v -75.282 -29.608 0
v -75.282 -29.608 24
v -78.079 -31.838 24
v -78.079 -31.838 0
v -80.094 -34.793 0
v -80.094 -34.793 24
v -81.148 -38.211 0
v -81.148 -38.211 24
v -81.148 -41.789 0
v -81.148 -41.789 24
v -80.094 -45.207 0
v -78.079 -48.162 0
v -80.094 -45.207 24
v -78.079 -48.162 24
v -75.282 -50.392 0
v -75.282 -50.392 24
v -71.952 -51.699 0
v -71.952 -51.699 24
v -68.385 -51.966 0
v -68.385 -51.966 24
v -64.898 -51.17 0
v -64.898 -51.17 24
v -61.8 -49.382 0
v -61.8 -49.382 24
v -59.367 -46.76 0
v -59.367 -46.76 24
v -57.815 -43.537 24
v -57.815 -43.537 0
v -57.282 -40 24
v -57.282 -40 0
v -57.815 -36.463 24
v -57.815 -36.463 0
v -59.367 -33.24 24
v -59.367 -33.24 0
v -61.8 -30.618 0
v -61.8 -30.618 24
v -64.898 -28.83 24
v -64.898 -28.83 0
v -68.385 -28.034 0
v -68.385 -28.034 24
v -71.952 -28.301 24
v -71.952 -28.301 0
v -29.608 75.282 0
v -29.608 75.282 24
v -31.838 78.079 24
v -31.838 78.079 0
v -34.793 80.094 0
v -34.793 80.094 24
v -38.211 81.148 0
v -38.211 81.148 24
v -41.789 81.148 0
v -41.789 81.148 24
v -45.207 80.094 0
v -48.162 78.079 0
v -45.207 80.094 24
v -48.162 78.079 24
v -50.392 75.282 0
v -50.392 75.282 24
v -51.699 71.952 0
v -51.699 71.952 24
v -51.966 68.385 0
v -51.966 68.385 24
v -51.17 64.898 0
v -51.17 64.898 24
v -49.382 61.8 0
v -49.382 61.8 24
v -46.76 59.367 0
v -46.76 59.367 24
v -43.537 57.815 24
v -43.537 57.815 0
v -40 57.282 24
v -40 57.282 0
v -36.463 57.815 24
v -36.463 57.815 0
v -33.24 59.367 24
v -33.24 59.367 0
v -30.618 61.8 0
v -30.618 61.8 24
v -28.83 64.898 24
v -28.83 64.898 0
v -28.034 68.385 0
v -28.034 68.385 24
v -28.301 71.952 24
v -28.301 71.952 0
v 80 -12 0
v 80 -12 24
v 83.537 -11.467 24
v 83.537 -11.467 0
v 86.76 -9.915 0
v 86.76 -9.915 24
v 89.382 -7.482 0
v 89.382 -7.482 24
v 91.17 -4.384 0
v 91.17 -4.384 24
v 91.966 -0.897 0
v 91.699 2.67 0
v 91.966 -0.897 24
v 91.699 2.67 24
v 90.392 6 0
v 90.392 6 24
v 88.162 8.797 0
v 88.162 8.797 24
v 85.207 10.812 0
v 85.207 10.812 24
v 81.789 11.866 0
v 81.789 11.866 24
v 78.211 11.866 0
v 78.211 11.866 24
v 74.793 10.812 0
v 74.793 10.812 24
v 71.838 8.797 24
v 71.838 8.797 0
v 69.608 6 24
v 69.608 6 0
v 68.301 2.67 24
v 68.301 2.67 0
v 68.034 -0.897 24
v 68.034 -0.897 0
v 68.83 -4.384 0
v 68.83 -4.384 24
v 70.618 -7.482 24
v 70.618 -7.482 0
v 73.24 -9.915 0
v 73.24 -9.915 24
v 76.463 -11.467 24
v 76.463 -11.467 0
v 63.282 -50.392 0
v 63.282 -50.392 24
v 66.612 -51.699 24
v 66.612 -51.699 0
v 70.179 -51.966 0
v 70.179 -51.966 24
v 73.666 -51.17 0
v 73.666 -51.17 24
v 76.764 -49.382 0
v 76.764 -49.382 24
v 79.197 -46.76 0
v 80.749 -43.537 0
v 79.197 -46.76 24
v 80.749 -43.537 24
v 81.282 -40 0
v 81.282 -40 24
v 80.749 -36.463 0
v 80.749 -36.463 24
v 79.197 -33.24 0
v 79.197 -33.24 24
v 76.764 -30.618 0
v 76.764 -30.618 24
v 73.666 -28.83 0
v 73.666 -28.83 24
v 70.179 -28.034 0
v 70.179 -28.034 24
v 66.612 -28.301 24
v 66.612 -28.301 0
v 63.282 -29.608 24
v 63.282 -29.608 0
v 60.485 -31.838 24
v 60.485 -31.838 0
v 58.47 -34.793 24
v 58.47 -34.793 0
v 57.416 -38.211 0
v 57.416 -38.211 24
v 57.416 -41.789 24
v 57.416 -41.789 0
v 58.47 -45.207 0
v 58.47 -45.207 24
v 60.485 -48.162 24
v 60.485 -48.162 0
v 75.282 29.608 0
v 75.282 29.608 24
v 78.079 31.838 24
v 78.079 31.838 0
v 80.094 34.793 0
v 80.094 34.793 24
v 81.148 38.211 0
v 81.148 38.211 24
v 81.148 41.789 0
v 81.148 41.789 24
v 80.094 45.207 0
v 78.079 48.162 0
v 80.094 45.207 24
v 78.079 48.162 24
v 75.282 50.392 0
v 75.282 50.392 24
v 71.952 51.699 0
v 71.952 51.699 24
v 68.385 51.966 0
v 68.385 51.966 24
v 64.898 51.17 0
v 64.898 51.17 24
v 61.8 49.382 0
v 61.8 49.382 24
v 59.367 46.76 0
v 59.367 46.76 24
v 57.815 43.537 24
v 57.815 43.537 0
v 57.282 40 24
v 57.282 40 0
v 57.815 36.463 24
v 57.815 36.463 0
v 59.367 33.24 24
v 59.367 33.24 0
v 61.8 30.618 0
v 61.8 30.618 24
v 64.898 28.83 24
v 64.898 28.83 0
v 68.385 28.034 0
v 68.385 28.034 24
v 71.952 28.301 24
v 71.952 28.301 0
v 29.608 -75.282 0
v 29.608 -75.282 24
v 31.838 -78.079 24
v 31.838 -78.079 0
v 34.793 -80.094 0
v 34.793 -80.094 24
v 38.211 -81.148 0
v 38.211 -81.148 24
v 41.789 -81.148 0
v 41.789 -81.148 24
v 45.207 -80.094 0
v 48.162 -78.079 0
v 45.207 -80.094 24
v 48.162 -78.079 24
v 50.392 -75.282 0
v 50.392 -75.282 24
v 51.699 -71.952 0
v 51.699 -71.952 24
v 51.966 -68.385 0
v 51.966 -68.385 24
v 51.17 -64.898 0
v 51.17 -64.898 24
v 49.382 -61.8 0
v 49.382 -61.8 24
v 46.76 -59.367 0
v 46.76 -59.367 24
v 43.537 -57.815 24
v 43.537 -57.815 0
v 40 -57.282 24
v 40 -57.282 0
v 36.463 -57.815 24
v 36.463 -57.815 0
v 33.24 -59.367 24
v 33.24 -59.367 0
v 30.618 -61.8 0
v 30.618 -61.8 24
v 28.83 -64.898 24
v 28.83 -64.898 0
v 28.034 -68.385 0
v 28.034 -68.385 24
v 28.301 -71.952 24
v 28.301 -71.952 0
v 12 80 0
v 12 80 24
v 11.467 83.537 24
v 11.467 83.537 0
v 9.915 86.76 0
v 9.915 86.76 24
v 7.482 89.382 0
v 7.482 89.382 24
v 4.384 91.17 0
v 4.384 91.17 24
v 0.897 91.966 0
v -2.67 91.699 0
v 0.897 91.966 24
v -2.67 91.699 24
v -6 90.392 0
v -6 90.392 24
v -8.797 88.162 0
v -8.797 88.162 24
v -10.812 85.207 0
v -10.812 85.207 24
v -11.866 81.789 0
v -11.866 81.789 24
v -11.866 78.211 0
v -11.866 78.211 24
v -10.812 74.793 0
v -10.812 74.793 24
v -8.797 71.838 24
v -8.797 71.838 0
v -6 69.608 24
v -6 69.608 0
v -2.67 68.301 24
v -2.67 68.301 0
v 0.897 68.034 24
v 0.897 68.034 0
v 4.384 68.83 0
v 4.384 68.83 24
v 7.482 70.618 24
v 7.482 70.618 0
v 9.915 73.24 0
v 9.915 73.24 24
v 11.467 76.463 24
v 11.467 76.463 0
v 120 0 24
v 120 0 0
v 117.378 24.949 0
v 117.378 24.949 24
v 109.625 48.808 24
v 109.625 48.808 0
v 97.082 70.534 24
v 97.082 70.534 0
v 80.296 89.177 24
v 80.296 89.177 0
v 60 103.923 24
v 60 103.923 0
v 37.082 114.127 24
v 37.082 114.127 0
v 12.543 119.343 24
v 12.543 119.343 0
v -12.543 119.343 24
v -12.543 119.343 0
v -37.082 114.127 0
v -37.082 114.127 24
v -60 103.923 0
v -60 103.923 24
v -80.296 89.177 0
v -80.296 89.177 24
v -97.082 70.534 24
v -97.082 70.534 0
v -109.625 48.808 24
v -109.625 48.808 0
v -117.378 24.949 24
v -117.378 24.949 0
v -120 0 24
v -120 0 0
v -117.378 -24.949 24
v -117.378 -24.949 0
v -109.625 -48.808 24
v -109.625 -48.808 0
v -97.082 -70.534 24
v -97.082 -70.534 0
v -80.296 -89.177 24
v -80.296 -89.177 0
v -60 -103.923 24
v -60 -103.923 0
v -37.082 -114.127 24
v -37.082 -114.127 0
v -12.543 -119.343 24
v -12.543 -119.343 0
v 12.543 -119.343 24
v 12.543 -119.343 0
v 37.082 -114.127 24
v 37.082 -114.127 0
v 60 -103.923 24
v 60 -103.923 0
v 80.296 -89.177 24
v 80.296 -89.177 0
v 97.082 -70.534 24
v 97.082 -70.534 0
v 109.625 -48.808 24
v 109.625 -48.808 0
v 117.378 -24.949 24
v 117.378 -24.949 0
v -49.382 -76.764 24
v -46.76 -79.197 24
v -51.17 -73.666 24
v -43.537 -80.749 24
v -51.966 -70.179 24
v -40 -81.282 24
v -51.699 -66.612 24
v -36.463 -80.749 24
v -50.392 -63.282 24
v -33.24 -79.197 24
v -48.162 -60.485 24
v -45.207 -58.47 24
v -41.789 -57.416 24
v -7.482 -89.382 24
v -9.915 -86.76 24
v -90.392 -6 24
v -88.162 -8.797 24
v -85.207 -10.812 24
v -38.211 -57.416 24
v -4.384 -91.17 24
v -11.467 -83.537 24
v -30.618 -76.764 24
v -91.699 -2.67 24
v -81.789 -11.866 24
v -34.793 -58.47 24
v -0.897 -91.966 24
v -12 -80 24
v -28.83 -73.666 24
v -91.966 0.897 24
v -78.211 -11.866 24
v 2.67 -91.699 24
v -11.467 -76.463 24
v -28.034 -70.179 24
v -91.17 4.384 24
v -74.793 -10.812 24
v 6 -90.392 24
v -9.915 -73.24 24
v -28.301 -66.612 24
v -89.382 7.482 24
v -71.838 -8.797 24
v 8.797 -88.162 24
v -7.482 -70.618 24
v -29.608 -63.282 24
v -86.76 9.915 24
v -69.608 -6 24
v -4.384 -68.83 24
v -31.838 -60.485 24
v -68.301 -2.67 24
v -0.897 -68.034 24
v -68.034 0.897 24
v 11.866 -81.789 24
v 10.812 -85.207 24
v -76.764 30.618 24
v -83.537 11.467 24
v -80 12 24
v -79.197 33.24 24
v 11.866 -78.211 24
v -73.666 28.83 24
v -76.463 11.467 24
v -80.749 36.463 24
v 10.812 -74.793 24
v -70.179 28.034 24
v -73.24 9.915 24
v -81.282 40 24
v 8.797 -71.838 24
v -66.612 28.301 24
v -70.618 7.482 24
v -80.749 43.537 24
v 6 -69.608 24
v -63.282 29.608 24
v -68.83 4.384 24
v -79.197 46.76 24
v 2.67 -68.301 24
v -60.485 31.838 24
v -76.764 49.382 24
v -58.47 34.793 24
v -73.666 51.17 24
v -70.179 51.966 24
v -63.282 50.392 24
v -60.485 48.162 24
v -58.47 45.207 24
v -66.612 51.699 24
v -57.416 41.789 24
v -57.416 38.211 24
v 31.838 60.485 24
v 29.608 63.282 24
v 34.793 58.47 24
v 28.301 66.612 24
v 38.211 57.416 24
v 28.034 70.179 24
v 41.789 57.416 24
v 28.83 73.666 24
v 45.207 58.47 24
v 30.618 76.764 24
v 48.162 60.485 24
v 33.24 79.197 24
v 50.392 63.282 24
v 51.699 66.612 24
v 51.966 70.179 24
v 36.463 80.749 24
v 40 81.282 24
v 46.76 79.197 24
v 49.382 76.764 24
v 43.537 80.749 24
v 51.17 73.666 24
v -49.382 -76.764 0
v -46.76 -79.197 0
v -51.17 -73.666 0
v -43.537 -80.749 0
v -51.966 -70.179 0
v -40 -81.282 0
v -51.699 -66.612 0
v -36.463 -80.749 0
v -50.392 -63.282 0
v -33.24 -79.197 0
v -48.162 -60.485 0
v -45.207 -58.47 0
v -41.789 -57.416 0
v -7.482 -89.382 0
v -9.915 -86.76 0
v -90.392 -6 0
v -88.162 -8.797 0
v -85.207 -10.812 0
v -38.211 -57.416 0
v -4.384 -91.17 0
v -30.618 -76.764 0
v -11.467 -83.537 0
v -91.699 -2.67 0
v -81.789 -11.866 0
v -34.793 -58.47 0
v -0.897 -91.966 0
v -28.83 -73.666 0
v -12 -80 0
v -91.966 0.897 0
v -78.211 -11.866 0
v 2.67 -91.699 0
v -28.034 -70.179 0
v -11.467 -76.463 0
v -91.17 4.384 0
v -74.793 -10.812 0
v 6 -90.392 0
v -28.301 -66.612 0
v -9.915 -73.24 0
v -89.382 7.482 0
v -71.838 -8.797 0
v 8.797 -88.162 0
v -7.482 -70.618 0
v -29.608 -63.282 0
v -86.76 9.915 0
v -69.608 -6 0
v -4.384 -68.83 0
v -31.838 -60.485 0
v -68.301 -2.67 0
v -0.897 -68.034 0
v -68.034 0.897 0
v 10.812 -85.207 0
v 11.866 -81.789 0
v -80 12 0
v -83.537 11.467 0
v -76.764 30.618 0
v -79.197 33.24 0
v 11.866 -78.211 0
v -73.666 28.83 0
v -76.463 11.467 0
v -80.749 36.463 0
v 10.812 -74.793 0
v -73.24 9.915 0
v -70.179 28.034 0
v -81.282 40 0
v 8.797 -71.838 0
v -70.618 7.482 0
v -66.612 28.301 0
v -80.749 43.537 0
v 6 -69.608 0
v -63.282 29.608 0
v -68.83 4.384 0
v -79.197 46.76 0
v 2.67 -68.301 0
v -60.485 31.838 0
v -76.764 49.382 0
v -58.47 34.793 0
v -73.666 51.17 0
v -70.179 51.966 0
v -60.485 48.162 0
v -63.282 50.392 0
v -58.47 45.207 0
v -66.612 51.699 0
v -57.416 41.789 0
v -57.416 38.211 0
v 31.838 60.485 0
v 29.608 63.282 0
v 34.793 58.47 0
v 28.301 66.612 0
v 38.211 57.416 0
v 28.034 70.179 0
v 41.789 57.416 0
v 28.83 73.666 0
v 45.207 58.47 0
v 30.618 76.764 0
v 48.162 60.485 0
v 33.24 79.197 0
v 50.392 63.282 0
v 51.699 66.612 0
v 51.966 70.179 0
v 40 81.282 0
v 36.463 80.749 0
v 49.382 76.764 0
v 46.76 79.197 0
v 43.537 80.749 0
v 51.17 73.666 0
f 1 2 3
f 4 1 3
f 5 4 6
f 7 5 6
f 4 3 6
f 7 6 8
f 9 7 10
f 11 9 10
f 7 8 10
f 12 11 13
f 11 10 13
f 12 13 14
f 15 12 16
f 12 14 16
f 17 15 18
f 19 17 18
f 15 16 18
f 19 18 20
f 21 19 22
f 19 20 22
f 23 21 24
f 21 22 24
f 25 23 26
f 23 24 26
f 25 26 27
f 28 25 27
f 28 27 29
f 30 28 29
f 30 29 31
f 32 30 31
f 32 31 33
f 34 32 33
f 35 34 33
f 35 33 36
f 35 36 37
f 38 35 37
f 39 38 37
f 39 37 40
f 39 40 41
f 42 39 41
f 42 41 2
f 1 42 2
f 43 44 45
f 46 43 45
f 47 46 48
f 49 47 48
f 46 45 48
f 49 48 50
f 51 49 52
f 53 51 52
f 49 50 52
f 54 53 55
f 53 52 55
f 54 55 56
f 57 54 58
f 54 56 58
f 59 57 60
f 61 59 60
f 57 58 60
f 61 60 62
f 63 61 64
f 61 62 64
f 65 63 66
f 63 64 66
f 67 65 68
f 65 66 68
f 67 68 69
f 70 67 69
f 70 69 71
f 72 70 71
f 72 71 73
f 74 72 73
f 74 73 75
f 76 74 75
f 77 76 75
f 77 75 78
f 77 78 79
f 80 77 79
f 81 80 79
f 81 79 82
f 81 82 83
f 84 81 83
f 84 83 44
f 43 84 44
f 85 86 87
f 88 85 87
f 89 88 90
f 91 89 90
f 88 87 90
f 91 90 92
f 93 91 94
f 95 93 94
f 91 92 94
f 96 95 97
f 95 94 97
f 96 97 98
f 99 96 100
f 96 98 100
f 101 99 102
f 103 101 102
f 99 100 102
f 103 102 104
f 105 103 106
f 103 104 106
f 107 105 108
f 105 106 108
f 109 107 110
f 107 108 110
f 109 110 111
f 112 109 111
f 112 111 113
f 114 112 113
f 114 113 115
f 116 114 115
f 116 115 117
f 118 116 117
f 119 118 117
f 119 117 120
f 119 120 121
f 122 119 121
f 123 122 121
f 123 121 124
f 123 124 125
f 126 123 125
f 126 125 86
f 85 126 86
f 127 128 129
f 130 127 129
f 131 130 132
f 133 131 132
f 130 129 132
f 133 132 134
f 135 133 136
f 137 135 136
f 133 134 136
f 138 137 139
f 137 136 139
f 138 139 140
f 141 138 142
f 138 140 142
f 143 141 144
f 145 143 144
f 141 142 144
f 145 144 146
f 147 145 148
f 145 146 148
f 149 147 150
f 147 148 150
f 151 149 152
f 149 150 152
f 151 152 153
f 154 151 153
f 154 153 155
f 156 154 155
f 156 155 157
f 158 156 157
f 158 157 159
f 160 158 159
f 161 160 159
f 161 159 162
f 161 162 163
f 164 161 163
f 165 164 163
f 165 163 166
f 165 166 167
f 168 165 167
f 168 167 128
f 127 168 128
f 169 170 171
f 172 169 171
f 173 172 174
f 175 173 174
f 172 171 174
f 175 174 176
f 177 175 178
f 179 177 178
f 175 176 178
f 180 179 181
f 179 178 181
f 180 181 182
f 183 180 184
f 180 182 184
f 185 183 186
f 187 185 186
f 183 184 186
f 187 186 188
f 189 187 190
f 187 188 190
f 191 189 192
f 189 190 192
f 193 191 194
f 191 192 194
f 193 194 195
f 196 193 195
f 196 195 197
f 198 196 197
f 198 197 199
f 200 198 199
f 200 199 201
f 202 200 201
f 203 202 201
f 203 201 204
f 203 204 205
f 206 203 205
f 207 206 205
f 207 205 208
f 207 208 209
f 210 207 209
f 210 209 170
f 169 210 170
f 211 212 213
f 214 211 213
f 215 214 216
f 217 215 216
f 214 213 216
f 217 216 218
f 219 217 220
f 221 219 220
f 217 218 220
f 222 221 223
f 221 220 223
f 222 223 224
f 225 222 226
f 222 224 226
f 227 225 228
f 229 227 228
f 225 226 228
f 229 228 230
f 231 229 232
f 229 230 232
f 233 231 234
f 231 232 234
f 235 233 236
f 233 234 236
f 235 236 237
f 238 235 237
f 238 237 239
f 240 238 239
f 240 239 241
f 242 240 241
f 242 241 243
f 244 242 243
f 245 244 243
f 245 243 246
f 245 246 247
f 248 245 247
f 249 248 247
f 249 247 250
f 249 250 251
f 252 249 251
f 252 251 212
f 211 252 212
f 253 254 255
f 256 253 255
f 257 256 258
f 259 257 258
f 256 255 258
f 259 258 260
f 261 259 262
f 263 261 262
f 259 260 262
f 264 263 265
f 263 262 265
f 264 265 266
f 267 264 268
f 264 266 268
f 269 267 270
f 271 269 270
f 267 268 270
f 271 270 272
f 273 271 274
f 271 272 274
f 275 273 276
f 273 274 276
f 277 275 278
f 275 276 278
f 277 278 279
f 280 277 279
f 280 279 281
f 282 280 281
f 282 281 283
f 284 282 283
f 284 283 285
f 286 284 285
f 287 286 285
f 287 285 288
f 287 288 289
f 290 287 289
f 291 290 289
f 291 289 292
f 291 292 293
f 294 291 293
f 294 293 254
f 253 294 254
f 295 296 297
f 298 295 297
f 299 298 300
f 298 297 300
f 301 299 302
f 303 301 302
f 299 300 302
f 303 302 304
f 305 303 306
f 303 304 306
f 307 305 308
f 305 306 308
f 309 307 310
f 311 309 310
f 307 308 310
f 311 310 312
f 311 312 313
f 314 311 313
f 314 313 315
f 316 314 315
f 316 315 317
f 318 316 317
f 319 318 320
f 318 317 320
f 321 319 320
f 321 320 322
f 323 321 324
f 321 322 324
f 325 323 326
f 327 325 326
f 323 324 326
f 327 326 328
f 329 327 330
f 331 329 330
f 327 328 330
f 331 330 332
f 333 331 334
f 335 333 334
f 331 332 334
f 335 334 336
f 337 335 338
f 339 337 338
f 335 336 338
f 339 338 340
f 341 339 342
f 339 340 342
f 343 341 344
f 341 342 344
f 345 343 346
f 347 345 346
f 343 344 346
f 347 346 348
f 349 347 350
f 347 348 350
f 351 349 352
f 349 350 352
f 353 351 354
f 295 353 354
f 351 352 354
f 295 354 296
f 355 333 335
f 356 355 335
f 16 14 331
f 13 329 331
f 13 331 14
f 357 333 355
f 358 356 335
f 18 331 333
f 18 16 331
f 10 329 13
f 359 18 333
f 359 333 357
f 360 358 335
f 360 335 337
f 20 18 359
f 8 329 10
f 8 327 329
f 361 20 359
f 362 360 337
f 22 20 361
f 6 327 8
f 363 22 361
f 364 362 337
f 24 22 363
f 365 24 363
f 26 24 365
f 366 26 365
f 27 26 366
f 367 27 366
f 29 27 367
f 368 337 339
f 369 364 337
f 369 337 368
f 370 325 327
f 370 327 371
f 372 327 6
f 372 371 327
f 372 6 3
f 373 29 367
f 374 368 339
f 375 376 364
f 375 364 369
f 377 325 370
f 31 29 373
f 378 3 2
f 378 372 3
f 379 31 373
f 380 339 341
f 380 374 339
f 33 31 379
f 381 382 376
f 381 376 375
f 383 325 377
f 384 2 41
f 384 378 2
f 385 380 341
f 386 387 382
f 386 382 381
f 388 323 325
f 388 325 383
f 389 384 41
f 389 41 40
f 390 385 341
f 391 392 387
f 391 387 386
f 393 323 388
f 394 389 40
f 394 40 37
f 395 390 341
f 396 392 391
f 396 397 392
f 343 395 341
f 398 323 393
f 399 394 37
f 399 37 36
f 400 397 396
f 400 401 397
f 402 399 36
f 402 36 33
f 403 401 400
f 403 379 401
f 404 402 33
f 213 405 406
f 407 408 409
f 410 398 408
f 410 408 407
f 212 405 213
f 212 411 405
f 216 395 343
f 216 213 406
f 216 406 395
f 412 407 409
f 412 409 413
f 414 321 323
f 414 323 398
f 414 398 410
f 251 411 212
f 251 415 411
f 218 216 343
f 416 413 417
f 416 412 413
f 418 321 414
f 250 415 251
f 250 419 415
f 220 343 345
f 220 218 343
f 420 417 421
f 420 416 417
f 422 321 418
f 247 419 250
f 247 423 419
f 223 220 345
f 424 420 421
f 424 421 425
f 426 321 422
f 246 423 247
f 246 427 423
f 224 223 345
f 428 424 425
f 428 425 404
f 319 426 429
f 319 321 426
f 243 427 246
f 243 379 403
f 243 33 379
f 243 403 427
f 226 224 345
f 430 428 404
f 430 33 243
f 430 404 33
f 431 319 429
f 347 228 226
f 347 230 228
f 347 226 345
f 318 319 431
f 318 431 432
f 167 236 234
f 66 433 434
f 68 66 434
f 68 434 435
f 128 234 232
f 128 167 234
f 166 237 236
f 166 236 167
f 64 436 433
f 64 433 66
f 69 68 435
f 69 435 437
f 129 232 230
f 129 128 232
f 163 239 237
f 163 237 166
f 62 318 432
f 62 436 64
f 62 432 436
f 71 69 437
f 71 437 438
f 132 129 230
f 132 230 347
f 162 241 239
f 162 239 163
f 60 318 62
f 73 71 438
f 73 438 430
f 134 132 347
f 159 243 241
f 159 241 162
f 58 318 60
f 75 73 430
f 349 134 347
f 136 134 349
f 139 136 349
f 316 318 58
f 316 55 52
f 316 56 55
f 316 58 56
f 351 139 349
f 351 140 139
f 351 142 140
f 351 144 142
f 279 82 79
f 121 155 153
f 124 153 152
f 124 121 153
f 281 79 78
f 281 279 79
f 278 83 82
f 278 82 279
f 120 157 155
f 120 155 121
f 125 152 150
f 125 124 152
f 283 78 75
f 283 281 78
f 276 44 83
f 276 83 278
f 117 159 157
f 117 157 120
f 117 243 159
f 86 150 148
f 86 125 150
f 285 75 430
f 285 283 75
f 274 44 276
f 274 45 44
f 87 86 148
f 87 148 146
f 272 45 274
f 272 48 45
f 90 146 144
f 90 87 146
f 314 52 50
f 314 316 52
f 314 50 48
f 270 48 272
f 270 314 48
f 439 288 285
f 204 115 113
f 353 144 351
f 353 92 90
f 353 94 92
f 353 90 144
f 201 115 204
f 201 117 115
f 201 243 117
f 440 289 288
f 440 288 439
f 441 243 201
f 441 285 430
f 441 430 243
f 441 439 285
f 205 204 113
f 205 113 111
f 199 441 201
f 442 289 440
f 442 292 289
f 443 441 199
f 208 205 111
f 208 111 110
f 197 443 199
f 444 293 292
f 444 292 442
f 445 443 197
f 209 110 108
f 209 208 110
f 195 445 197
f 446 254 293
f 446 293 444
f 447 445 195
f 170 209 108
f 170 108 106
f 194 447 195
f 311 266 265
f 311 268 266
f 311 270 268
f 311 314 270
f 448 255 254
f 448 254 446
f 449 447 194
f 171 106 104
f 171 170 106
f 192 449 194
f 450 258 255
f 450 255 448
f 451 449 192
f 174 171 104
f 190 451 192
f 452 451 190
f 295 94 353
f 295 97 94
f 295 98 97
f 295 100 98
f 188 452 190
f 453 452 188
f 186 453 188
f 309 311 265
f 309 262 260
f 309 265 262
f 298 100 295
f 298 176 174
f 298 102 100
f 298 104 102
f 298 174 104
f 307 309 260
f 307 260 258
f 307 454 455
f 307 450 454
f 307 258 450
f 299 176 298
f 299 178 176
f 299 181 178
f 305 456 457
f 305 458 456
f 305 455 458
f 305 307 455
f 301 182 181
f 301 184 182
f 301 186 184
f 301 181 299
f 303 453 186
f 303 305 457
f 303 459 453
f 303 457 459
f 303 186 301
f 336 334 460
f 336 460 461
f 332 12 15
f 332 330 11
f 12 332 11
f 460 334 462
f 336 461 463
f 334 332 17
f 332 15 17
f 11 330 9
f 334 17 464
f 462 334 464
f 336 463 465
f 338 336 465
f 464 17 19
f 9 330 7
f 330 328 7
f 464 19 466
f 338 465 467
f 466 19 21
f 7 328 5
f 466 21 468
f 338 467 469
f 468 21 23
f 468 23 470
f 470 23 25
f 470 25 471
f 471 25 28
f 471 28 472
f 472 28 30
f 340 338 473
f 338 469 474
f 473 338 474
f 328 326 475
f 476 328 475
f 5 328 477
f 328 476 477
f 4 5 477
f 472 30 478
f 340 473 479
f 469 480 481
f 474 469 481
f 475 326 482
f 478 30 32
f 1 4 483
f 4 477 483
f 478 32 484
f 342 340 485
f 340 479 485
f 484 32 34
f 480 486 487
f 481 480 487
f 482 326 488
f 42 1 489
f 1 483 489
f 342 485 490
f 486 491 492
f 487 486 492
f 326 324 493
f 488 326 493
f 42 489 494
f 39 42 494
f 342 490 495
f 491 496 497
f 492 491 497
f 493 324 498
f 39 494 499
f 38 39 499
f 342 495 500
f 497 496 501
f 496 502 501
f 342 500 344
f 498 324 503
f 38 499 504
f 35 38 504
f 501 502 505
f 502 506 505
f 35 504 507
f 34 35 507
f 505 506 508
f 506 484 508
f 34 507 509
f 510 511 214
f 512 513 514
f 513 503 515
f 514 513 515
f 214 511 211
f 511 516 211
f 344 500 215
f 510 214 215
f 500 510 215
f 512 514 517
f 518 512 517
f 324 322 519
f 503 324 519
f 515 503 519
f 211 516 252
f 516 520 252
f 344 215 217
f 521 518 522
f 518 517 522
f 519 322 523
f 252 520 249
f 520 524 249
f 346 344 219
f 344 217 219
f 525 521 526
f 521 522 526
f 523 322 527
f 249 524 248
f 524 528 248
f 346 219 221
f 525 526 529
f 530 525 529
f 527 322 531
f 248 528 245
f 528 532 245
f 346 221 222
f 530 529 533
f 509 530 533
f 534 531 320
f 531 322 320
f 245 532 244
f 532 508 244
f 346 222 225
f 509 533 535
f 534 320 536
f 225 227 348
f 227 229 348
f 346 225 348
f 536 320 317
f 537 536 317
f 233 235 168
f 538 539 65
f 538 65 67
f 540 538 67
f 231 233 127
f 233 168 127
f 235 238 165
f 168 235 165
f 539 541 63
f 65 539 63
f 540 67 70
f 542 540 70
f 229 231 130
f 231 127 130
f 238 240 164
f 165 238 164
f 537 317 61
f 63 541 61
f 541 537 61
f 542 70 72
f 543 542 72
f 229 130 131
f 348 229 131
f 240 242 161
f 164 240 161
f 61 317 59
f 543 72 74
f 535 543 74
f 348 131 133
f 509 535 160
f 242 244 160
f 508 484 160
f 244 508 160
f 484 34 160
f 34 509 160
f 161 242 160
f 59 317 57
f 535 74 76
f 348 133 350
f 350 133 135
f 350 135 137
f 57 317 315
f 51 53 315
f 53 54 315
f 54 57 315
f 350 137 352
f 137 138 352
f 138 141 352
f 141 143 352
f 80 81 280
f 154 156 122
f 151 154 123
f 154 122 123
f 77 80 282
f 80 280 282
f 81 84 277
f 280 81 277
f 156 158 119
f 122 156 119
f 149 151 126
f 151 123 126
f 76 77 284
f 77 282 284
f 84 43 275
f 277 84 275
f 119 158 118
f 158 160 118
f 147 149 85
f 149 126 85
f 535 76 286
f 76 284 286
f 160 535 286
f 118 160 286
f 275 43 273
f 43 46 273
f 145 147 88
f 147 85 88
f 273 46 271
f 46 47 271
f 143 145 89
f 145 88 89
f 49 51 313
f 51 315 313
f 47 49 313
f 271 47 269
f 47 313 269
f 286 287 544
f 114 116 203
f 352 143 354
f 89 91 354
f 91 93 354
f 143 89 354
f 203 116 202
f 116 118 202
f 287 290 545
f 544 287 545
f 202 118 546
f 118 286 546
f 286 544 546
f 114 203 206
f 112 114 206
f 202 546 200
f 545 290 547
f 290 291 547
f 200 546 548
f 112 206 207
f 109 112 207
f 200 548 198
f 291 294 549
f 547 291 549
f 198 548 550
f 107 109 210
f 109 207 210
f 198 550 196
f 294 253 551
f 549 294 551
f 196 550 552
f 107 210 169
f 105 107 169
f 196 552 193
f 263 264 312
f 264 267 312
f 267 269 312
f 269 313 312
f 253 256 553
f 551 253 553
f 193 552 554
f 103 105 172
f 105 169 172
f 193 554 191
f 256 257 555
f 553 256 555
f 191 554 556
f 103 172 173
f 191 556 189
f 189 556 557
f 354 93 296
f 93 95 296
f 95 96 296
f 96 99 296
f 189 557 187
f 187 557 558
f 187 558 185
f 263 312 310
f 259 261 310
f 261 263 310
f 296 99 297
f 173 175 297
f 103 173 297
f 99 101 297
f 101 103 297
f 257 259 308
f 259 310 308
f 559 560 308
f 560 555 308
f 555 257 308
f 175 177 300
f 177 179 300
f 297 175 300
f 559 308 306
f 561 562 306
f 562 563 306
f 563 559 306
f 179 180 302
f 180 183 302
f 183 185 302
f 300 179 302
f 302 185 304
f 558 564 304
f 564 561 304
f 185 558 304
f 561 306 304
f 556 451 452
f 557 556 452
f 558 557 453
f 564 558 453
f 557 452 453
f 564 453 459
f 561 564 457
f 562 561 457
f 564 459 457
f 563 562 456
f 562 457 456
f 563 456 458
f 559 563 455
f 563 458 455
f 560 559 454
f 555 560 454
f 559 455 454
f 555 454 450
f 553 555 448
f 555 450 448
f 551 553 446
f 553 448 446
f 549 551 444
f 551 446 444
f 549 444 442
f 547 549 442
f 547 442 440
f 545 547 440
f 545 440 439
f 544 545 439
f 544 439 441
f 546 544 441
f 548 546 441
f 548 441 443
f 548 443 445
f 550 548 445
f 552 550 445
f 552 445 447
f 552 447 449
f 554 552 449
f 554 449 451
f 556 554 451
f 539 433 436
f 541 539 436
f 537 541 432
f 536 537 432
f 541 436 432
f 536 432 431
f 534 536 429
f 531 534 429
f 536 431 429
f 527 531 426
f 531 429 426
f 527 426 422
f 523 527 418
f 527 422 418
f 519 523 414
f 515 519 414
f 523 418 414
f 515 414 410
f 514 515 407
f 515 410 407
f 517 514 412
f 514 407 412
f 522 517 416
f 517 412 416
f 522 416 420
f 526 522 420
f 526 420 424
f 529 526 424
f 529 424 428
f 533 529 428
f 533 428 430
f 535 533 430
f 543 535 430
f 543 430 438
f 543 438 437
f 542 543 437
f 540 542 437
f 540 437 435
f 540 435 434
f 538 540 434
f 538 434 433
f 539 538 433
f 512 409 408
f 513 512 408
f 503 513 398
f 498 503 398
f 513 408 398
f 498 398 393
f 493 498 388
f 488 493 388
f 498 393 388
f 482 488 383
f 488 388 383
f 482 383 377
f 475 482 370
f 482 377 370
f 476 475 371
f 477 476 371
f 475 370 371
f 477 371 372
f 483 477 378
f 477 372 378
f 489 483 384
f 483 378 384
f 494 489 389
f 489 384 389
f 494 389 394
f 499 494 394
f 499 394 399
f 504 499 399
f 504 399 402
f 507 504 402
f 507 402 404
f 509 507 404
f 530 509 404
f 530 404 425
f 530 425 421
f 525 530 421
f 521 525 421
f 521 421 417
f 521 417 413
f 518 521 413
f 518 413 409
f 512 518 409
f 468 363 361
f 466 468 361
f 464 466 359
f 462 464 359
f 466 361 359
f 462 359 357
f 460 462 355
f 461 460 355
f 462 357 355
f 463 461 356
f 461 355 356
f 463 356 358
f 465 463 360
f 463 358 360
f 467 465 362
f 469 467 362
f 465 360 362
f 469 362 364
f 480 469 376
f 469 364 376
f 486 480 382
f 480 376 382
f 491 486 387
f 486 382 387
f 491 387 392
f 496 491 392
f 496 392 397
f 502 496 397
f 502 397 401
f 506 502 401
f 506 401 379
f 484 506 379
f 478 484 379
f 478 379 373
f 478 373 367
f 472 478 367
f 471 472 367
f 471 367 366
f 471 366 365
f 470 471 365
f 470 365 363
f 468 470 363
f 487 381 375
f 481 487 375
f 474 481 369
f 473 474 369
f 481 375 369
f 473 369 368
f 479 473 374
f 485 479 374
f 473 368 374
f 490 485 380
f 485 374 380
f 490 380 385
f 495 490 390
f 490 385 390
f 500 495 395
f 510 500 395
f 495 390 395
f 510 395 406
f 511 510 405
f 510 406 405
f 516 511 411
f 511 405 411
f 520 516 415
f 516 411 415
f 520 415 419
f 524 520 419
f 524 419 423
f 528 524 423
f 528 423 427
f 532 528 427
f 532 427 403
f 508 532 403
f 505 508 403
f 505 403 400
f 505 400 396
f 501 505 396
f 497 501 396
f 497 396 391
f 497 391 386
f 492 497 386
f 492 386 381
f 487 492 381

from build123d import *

# Parameters (mm, degrees)
F2_R            = 120
F3_DEPTH        = 24
F4_R            = 12
F5_DEPTH        = 24.001
F5_COPIES_COUNT = 12


# Not quite as in the source:
# - a pattern or mirror of a feature is missing from the dataset's text; its kind, count and spacing are read off the source's solid


with BuildPart() as f3:
    # F2 (on Top) → F3 (new body)
    with BuildSketch(Plane.XY):
        Circle(F2_R)
    extrude(amount=F3_DEPTH)

    # F4 (on face) → F5 (cut, through all)
    with BuildSketch(Plane.XY.offset(24)):
        with Locations((0, 80)):
            Circle(F4_R)
    f5 = extrude(amount=-F5_DEPTH, mode=Mode.SUBTRACT)

    # F5_copies: F5 ×12 about axis
    f5_copies_axis = Axis((0, 0, 0), (0, 0, 1))
    for i in range(1, F5_COPIES_COUNT):
        add(f5.rotate(f5_copies_axis, i * 360 / F5_COPIES_COUNT), mode=Mode.SUBTRACT)


solid = f3.part
